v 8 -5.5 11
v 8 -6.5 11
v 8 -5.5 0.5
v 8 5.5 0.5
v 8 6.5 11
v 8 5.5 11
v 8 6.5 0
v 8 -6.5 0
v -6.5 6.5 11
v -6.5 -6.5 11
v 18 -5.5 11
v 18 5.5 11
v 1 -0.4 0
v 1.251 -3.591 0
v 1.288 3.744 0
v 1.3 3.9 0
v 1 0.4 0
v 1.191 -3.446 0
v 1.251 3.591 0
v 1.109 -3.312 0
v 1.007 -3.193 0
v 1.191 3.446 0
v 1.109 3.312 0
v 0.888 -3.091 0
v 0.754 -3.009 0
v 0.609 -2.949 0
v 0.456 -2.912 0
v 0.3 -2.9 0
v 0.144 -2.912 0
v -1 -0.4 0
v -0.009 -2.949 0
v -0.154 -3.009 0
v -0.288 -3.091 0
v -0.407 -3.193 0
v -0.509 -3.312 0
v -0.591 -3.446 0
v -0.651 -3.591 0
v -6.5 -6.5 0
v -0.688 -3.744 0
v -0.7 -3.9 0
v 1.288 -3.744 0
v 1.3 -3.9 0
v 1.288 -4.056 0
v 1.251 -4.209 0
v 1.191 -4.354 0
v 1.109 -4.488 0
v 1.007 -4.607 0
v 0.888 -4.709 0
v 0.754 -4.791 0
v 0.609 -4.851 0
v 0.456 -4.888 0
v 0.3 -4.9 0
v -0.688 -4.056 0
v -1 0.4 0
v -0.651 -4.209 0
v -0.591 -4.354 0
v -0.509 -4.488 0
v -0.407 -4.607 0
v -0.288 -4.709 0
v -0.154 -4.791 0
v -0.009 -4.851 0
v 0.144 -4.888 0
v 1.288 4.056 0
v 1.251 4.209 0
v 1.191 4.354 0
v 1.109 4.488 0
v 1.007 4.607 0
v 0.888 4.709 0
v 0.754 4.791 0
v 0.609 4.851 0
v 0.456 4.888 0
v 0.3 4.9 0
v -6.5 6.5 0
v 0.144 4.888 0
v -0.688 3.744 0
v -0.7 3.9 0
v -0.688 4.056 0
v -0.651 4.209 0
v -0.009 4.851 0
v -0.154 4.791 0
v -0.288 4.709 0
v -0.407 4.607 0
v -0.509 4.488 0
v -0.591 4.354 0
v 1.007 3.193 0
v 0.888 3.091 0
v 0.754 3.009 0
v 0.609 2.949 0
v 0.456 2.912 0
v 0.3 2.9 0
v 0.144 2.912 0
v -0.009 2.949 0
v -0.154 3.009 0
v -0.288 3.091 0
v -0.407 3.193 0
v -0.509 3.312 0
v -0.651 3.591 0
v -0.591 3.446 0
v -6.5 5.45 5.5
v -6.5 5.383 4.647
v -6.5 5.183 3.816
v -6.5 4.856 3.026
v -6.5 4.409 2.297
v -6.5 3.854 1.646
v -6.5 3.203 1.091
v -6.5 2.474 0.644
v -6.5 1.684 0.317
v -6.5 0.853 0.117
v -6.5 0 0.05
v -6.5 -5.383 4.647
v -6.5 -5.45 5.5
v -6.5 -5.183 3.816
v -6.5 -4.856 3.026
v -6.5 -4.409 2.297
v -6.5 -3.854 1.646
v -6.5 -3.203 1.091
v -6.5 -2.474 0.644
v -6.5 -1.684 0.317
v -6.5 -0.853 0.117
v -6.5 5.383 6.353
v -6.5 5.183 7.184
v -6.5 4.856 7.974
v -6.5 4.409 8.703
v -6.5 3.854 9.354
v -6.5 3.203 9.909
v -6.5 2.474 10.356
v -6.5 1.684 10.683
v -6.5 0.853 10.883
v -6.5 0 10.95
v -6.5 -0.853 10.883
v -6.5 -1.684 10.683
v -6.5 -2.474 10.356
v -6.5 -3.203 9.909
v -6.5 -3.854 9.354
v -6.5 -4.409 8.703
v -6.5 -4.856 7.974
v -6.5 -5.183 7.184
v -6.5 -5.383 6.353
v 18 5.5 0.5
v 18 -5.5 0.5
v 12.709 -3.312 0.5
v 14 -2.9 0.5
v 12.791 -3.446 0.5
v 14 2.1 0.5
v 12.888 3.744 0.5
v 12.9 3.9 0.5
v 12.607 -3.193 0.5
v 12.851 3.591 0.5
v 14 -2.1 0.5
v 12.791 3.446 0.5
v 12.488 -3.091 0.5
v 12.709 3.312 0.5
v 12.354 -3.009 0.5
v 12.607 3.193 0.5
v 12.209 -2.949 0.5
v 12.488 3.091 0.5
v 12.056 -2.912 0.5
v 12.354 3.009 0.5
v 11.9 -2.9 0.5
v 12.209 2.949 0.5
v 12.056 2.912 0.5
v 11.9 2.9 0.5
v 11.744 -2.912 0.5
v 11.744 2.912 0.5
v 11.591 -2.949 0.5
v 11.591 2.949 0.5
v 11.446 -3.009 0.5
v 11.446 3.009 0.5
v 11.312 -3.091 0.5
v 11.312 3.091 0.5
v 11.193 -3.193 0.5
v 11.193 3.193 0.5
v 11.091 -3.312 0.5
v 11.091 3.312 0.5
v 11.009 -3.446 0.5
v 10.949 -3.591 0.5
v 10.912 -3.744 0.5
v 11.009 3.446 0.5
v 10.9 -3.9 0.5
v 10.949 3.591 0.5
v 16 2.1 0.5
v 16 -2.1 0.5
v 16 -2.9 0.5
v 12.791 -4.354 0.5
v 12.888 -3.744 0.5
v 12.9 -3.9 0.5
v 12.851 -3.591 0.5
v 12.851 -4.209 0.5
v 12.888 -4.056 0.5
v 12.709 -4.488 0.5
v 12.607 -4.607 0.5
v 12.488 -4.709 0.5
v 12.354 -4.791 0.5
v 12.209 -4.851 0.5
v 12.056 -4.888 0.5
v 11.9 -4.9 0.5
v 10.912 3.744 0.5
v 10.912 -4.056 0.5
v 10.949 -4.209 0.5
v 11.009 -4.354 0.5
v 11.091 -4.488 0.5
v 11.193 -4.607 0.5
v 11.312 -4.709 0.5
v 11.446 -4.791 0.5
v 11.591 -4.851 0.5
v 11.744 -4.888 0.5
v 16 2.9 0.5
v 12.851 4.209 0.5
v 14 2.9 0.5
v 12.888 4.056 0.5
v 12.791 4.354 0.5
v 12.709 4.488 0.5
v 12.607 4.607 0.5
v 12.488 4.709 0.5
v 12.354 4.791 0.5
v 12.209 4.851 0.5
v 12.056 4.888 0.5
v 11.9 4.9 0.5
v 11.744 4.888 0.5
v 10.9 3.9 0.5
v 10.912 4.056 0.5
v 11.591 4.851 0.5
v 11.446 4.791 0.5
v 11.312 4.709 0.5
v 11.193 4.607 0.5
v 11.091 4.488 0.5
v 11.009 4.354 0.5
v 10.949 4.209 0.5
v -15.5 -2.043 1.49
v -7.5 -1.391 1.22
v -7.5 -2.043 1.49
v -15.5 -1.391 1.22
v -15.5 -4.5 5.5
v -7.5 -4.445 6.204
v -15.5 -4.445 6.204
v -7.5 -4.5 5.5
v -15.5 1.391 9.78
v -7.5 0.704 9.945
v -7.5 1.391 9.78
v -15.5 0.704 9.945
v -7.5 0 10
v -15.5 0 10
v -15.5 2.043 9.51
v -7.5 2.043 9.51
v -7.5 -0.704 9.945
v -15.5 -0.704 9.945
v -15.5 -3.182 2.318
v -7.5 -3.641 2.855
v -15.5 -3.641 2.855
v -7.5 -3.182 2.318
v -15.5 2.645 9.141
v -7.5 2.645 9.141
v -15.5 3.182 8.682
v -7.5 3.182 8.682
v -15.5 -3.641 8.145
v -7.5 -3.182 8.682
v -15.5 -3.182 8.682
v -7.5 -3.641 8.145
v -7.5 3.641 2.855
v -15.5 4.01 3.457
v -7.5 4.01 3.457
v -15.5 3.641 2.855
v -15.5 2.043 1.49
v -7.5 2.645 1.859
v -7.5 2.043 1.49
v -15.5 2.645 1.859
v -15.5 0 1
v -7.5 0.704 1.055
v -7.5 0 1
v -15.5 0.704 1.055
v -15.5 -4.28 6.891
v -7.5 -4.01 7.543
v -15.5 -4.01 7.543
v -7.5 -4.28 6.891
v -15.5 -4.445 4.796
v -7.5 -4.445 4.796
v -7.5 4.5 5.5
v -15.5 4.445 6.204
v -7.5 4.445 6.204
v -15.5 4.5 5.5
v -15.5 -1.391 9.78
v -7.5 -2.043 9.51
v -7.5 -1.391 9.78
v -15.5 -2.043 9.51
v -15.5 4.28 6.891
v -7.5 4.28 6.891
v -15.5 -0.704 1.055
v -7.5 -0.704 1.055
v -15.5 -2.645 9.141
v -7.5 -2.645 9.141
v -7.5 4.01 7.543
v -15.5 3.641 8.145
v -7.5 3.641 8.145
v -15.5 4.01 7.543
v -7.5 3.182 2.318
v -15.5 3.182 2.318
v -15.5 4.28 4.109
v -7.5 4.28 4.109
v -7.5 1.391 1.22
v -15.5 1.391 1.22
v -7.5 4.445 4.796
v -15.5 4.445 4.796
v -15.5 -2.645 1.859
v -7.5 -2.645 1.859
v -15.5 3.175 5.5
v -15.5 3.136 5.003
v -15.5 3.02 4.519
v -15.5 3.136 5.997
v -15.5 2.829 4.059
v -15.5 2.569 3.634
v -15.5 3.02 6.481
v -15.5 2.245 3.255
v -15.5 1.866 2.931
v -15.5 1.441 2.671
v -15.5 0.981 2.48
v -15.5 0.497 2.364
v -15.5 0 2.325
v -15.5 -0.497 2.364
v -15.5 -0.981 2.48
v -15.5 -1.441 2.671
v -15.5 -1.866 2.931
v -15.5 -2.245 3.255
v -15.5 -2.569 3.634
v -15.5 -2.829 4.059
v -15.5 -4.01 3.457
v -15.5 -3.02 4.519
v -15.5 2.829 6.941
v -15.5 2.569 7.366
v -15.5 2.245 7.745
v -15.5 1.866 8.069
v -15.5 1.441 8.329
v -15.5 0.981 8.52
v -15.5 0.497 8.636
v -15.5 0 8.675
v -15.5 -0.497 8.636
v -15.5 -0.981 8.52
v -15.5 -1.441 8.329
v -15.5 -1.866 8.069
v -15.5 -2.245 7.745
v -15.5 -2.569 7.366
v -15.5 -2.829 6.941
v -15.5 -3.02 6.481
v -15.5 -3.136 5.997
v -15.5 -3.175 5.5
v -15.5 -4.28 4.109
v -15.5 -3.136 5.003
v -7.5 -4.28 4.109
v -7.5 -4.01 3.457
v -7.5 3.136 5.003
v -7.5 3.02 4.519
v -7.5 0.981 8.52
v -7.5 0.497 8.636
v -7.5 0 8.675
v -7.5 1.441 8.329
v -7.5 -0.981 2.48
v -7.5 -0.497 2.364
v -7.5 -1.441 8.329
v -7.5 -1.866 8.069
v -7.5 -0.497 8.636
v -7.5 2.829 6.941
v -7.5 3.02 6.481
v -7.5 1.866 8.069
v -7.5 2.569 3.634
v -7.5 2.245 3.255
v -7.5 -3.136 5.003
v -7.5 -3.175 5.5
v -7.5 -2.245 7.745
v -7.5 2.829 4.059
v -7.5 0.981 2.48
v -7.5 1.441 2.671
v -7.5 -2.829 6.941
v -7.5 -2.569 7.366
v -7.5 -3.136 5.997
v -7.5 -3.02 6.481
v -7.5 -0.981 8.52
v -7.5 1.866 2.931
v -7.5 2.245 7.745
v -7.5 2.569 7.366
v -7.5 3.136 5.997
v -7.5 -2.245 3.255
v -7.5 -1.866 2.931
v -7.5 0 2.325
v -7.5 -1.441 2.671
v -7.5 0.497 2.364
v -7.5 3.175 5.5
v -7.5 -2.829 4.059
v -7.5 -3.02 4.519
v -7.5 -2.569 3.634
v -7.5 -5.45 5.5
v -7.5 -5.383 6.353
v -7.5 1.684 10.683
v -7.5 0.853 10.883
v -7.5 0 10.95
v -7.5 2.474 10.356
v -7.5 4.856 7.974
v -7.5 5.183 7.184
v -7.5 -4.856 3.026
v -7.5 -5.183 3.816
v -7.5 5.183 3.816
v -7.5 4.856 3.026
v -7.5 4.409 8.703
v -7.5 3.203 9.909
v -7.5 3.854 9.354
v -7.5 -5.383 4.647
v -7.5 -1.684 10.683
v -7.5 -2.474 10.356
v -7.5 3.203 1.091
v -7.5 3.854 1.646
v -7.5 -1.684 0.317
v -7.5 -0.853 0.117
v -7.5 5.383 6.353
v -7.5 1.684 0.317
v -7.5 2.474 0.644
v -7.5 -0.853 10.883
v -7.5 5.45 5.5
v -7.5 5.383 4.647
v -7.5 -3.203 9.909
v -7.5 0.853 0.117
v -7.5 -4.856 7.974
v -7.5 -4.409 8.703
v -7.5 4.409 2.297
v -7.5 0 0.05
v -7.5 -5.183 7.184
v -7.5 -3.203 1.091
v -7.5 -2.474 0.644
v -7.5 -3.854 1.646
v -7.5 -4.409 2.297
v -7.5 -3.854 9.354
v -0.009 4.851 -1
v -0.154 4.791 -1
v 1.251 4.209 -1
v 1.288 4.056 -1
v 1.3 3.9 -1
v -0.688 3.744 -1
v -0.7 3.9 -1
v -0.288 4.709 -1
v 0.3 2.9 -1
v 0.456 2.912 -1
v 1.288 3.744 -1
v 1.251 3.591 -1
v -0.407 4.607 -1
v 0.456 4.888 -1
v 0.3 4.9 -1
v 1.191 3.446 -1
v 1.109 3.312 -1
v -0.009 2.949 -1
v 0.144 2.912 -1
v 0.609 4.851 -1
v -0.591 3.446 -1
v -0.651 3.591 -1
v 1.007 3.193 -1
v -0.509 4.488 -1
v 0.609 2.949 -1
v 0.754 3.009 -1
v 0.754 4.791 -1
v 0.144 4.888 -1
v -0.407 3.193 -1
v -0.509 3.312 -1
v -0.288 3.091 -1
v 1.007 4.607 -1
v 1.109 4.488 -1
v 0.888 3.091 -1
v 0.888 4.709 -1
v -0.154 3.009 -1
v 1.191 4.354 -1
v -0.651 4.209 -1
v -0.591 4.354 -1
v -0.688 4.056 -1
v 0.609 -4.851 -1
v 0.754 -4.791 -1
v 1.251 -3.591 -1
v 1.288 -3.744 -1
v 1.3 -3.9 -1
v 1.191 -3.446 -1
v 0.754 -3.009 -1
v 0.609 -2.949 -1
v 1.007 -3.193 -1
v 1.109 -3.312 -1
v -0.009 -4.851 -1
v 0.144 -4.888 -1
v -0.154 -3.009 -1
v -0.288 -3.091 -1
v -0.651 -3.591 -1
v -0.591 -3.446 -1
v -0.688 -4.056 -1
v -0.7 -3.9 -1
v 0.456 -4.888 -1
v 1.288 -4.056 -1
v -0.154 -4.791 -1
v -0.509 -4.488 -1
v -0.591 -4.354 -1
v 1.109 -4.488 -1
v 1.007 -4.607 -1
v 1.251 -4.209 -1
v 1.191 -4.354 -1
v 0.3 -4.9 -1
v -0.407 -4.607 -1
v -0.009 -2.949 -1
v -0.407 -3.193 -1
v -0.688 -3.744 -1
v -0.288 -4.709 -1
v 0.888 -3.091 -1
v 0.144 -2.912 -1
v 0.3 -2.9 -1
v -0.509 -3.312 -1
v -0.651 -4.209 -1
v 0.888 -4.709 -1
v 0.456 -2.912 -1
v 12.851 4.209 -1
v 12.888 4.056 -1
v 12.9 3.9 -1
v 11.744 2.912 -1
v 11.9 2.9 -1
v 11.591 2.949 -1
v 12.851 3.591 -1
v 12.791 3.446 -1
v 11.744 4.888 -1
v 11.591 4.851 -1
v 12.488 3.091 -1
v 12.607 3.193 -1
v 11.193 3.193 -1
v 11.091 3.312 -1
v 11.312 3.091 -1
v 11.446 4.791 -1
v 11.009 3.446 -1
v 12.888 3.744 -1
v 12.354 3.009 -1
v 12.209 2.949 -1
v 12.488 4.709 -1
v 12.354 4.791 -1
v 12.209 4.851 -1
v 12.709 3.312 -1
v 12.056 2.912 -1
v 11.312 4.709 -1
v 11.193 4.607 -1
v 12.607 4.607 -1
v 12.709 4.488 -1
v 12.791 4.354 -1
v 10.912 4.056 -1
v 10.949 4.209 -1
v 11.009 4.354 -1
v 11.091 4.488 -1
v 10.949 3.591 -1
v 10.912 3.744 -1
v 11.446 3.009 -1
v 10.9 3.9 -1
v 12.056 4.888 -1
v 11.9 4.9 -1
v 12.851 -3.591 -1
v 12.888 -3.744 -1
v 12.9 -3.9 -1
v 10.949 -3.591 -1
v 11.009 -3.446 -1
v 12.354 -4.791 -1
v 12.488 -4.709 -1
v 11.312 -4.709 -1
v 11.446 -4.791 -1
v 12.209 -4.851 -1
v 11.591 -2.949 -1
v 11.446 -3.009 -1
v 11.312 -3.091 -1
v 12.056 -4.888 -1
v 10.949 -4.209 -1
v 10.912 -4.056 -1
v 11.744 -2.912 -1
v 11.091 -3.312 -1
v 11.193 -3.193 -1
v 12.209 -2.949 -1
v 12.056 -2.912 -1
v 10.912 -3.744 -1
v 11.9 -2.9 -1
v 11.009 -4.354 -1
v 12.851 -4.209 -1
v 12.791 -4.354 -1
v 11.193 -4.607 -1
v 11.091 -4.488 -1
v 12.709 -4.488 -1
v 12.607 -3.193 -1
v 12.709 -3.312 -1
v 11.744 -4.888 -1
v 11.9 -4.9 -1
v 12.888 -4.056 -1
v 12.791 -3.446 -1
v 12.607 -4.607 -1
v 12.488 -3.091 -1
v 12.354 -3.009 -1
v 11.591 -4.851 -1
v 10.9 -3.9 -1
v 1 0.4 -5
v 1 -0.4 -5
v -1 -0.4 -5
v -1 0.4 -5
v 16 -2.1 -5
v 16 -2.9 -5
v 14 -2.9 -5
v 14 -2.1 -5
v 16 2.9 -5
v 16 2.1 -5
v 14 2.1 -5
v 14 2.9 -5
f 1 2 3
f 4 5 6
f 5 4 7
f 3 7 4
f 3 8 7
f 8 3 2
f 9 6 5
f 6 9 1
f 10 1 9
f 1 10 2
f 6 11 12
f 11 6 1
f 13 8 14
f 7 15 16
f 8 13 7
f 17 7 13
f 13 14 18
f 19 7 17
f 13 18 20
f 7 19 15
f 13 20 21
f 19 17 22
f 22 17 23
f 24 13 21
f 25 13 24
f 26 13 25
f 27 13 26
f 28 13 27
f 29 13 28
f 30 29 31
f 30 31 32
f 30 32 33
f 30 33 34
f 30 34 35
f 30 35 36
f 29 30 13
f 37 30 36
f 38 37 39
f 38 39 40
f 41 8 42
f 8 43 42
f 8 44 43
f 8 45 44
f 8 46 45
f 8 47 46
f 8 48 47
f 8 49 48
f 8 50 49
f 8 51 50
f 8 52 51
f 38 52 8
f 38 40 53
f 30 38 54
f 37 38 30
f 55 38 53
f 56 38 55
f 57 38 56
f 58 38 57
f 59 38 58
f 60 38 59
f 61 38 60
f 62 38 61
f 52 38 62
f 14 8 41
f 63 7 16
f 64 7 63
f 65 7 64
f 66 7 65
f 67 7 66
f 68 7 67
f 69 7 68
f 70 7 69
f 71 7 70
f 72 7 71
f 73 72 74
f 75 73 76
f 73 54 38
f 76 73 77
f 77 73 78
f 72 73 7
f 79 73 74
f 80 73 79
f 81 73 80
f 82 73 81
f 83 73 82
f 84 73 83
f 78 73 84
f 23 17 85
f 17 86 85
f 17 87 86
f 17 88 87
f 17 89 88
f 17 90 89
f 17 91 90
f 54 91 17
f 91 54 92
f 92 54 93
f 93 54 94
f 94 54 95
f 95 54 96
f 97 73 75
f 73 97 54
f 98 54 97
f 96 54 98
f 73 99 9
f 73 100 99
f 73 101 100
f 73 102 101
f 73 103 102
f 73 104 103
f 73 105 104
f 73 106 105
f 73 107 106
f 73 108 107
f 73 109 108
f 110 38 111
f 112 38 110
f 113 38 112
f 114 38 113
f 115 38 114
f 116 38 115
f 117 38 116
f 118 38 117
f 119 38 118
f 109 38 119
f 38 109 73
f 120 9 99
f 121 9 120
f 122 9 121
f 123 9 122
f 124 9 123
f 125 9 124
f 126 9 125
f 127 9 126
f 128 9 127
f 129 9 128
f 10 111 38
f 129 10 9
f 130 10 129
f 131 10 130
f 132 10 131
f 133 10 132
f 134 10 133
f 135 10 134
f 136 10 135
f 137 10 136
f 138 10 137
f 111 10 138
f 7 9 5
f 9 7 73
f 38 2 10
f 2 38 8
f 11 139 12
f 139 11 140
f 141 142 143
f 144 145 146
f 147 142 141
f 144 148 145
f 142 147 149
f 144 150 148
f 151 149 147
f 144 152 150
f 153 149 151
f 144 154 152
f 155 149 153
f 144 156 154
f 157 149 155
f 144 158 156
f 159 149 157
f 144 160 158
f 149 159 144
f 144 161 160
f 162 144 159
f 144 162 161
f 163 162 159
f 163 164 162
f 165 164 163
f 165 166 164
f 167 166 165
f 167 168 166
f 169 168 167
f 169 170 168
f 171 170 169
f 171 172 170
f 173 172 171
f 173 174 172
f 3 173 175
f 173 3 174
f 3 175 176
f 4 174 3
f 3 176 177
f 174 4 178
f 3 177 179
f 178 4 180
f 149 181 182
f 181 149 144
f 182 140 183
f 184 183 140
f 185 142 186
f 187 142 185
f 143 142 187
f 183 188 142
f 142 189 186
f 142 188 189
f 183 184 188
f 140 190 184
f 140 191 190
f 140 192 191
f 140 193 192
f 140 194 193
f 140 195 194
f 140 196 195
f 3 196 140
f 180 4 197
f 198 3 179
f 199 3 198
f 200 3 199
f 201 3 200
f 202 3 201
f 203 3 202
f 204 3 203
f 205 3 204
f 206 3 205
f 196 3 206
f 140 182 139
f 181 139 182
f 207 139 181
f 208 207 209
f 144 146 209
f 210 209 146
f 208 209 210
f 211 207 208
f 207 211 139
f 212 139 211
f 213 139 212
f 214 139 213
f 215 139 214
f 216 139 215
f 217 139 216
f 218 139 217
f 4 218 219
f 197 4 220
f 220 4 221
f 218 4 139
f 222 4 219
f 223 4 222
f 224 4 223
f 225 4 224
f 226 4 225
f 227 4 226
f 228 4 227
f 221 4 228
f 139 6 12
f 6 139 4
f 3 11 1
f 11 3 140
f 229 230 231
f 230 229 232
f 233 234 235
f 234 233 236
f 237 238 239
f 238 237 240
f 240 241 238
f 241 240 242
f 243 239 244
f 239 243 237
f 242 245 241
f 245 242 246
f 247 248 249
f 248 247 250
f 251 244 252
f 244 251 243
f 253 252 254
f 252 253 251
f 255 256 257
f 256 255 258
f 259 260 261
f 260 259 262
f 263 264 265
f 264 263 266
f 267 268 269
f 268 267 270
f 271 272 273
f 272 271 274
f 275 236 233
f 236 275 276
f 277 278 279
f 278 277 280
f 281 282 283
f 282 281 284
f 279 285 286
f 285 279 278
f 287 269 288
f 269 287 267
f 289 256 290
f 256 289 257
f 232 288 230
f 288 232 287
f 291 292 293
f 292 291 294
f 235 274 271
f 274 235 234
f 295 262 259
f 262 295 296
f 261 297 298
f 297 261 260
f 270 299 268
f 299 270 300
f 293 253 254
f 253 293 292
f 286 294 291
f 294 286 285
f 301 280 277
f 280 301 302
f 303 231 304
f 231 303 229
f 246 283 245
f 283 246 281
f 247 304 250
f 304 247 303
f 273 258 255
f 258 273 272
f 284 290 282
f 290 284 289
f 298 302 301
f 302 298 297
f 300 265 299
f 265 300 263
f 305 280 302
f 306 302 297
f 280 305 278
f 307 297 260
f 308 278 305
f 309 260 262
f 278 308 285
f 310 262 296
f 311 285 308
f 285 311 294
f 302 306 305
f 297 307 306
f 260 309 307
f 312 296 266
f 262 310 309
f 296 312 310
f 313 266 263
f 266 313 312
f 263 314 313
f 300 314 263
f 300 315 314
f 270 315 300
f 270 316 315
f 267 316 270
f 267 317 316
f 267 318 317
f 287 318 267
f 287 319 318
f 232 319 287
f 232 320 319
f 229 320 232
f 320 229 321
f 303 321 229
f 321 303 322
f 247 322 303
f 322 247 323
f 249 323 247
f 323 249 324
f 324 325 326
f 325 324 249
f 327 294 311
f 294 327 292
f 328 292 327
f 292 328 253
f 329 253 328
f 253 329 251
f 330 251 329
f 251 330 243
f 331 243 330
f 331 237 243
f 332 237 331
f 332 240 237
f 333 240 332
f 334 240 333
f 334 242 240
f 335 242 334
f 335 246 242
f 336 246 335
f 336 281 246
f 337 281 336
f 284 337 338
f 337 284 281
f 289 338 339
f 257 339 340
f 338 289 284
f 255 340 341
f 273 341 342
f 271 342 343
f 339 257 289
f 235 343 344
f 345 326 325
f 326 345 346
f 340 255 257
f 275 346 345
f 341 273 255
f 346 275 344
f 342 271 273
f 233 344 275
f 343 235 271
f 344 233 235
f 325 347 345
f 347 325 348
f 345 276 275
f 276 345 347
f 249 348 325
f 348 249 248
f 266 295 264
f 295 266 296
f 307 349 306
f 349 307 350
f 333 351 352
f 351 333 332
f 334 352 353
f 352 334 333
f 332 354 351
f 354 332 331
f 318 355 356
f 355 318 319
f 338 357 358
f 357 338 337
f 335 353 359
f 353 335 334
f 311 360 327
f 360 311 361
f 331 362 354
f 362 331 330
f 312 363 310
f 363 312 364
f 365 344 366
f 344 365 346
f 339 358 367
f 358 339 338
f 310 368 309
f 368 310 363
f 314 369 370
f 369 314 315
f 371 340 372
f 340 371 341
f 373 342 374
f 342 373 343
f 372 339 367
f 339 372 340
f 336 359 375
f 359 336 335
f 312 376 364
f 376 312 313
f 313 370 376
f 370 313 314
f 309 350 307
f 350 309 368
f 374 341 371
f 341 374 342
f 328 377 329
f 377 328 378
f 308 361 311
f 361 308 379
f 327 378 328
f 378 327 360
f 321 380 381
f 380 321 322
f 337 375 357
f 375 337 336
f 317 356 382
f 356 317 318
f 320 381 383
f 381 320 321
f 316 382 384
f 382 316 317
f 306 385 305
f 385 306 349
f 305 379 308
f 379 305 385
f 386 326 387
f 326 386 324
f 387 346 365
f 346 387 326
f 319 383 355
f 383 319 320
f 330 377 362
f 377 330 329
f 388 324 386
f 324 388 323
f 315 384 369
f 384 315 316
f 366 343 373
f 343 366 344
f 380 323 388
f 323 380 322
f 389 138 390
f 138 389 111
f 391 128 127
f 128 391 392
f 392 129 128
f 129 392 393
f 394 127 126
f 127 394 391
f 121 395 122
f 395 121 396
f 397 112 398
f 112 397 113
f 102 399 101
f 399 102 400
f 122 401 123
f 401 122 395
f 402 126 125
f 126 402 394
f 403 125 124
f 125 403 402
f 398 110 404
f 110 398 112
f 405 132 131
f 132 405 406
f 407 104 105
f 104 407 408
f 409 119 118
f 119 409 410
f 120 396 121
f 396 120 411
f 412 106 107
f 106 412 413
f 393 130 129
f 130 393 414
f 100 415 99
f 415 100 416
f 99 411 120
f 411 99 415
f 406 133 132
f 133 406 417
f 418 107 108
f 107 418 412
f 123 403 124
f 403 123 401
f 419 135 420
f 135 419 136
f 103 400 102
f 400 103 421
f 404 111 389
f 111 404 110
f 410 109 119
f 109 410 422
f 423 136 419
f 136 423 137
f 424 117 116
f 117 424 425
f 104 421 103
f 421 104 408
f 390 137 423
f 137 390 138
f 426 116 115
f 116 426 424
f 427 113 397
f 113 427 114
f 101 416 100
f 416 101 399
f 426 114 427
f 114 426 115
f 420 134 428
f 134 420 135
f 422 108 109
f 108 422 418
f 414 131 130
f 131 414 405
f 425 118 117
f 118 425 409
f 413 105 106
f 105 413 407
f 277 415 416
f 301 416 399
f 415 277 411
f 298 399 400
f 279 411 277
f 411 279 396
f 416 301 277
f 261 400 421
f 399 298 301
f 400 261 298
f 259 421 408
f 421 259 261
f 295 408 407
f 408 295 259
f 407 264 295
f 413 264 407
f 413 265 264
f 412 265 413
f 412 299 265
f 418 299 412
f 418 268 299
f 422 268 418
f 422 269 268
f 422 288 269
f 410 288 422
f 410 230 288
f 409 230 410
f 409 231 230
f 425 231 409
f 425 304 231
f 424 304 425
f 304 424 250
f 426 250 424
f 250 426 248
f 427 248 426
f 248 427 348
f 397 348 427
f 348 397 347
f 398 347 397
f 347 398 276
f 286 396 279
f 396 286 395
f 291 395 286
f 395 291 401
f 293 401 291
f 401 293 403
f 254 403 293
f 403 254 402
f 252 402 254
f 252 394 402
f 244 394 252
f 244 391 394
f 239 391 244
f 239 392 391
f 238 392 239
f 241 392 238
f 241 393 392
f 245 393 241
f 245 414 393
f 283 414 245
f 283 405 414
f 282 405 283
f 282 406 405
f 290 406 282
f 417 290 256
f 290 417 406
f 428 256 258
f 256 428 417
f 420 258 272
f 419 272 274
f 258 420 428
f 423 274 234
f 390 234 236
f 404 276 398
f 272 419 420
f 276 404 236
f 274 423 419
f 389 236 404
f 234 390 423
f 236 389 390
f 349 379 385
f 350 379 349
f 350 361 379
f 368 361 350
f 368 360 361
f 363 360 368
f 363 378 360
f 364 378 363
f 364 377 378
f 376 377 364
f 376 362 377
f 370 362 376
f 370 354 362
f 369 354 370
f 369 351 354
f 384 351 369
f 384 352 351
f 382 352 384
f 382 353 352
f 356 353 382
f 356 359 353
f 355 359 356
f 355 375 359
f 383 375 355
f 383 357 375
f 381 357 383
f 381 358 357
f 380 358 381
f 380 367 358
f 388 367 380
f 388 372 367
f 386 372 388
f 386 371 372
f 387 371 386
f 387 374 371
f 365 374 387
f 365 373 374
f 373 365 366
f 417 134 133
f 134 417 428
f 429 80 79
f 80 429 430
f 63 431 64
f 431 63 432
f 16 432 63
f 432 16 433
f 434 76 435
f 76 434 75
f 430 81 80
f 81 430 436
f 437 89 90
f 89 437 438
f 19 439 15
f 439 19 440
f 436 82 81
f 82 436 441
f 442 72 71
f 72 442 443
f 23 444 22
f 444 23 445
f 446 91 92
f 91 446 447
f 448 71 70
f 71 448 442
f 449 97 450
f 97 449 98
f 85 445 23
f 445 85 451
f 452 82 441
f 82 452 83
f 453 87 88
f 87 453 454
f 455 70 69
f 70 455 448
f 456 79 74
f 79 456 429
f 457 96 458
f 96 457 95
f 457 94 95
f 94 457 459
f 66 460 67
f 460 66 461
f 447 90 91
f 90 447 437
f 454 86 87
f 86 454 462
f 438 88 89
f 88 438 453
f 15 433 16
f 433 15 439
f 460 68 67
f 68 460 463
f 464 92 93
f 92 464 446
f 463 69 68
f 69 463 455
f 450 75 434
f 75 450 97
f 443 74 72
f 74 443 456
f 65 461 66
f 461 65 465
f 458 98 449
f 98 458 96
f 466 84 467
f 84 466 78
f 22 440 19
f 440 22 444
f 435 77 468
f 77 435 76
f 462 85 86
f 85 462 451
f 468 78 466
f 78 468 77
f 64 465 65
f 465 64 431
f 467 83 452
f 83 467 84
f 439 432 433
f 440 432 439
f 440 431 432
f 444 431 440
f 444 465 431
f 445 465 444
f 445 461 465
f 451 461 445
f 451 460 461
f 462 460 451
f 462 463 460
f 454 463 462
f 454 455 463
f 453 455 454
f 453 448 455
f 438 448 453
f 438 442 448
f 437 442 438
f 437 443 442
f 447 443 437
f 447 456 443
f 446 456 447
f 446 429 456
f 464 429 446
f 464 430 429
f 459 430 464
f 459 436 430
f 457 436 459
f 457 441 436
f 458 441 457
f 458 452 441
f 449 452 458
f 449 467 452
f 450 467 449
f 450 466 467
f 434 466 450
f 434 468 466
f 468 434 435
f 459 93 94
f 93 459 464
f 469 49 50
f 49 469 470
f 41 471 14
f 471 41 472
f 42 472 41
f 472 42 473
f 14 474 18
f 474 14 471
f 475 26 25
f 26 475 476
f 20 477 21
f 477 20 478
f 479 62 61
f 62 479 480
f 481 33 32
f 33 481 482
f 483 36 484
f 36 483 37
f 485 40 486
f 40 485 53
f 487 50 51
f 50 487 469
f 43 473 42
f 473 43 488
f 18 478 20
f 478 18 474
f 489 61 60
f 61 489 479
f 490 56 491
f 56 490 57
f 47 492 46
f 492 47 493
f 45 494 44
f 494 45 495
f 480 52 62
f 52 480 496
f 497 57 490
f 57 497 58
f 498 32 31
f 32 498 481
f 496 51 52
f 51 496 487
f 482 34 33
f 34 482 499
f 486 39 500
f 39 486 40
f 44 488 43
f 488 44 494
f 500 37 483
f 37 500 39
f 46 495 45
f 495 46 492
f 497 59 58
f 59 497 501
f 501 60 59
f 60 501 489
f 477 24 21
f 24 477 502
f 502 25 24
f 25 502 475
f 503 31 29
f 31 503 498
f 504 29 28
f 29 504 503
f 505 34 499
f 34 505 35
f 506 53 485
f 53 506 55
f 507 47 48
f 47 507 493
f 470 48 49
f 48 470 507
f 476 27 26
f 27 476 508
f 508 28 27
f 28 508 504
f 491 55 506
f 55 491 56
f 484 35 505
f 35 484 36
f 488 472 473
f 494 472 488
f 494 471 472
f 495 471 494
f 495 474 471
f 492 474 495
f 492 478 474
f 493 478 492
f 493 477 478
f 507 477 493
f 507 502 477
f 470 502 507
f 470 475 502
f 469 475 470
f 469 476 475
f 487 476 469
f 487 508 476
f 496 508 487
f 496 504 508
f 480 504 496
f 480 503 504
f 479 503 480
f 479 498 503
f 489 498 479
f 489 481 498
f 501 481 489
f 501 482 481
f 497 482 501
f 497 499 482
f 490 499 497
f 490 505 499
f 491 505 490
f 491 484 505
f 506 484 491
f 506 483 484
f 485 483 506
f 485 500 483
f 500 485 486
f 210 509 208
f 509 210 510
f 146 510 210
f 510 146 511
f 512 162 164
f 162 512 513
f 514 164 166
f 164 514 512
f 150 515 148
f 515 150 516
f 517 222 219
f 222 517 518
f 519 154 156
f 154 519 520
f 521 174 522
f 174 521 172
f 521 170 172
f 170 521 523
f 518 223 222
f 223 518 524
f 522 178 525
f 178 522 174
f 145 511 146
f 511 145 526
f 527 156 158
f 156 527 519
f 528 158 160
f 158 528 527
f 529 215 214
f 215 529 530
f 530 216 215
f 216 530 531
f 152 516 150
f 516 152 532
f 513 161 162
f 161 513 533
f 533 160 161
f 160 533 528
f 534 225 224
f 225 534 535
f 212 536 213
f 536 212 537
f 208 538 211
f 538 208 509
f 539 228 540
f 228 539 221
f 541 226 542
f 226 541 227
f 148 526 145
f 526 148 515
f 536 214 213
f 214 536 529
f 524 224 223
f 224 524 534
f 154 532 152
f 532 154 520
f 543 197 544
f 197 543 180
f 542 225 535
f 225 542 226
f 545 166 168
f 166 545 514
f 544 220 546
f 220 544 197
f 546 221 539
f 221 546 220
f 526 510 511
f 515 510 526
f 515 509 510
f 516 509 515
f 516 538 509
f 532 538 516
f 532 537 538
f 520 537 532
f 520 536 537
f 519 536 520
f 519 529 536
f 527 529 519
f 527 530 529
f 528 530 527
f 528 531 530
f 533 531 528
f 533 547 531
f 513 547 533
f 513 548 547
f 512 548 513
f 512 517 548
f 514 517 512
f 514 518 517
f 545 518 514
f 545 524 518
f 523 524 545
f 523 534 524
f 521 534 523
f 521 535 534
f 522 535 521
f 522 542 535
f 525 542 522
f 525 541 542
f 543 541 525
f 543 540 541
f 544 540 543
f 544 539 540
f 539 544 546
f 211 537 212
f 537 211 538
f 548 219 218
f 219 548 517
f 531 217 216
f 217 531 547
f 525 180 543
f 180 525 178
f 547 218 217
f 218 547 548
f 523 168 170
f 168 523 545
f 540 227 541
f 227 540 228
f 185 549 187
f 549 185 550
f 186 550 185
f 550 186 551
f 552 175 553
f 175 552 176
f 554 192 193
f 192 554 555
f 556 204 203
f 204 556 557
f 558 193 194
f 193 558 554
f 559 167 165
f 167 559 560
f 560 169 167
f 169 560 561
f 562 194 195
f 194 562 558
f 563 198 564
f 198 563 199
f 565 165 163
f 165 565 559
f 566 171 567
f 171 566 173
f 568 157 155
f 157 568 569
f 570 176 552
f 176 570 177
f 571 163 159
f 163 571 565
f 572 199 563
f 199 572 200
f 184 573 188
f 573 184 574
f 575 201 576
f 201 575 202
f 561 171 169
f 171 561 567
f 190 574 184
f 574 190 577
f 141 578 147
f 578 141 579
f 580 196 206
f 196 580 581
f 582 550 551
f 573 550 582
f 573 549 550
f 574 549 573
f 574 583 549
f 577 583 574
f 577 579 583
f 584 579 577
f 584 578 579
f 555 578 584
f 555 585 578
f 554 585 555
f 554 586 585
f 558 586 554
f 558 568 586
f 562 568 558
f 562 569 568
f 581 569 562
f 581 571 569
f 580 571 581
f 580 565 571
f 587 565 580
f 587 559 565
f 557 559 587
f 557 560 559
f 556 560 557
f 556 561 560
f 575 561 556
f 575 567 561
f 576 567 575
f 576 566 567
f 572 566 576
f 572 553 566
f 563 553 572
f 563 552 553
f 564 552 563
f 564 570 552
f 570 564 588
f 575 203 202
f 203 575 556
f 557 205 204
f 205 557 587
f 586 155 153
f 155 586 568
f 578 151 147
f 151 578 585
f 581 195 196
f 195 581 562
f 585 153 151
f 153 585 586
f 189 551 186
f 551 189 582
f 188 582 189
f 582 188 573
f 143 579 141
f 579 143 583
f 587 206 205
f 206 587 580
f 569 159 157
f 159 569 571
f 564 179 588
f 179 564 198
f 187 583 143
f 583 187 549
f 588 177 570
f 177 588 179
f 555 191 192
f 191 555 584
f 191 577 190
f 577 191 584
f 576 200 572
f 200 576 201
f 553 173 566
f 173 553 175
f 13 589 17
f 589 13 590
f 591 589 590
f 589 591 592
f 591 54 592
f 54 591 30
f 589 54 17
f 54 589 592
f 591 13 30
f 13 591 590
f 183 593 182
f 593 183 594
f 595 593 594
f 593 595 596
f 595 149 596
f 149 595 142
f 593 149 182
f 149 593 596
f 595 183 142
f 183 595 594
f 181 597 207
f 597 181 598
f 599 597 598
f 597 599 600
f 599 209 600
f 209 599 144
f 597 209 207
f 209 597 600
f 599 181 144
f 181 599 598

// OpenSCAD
$fn=40;

black = [0.2,0.2,0.2];
silver = [0.75,0.75,0.75];

// The model is centered on the front pin
// as per the data sheet
pins = [ [0, 0], [15, -2.5], [15, 2.5]];

feet = [ [ 0.3,3.9], [ 0.3,-3.9],
	 [11.9,3.9], [11.9,-3.9] ];

module body()
{
    translate([-6.5,-6.5])
	cube([14.5,13,11]);
    translate([8,-5.5,0.5])
	cube([10,11,10.5]);
}

module barrel()
{
    difference() {
	cylinder(9, d=9);
	translate([0,0,-1])
	    cylinder(11, d=6.35);
    }

}

module jack()
{
    translate([-6.5,0,5.5]) rotate([0,-90,0]) {
	cylinder(1, d=10.9);
	barrel();
    }
}

color(black) body();
color(silver) jack();

// Feet or locating pins..
color(black) translate([0,0,-1]) for (pos = feet)
	translate(pos) cylinder(2, d=2);

// Pins
color(silver) for (pos = pins)
	translate(pos) translate([0,0,-2]) cube([2,0.8,6], center=true);
